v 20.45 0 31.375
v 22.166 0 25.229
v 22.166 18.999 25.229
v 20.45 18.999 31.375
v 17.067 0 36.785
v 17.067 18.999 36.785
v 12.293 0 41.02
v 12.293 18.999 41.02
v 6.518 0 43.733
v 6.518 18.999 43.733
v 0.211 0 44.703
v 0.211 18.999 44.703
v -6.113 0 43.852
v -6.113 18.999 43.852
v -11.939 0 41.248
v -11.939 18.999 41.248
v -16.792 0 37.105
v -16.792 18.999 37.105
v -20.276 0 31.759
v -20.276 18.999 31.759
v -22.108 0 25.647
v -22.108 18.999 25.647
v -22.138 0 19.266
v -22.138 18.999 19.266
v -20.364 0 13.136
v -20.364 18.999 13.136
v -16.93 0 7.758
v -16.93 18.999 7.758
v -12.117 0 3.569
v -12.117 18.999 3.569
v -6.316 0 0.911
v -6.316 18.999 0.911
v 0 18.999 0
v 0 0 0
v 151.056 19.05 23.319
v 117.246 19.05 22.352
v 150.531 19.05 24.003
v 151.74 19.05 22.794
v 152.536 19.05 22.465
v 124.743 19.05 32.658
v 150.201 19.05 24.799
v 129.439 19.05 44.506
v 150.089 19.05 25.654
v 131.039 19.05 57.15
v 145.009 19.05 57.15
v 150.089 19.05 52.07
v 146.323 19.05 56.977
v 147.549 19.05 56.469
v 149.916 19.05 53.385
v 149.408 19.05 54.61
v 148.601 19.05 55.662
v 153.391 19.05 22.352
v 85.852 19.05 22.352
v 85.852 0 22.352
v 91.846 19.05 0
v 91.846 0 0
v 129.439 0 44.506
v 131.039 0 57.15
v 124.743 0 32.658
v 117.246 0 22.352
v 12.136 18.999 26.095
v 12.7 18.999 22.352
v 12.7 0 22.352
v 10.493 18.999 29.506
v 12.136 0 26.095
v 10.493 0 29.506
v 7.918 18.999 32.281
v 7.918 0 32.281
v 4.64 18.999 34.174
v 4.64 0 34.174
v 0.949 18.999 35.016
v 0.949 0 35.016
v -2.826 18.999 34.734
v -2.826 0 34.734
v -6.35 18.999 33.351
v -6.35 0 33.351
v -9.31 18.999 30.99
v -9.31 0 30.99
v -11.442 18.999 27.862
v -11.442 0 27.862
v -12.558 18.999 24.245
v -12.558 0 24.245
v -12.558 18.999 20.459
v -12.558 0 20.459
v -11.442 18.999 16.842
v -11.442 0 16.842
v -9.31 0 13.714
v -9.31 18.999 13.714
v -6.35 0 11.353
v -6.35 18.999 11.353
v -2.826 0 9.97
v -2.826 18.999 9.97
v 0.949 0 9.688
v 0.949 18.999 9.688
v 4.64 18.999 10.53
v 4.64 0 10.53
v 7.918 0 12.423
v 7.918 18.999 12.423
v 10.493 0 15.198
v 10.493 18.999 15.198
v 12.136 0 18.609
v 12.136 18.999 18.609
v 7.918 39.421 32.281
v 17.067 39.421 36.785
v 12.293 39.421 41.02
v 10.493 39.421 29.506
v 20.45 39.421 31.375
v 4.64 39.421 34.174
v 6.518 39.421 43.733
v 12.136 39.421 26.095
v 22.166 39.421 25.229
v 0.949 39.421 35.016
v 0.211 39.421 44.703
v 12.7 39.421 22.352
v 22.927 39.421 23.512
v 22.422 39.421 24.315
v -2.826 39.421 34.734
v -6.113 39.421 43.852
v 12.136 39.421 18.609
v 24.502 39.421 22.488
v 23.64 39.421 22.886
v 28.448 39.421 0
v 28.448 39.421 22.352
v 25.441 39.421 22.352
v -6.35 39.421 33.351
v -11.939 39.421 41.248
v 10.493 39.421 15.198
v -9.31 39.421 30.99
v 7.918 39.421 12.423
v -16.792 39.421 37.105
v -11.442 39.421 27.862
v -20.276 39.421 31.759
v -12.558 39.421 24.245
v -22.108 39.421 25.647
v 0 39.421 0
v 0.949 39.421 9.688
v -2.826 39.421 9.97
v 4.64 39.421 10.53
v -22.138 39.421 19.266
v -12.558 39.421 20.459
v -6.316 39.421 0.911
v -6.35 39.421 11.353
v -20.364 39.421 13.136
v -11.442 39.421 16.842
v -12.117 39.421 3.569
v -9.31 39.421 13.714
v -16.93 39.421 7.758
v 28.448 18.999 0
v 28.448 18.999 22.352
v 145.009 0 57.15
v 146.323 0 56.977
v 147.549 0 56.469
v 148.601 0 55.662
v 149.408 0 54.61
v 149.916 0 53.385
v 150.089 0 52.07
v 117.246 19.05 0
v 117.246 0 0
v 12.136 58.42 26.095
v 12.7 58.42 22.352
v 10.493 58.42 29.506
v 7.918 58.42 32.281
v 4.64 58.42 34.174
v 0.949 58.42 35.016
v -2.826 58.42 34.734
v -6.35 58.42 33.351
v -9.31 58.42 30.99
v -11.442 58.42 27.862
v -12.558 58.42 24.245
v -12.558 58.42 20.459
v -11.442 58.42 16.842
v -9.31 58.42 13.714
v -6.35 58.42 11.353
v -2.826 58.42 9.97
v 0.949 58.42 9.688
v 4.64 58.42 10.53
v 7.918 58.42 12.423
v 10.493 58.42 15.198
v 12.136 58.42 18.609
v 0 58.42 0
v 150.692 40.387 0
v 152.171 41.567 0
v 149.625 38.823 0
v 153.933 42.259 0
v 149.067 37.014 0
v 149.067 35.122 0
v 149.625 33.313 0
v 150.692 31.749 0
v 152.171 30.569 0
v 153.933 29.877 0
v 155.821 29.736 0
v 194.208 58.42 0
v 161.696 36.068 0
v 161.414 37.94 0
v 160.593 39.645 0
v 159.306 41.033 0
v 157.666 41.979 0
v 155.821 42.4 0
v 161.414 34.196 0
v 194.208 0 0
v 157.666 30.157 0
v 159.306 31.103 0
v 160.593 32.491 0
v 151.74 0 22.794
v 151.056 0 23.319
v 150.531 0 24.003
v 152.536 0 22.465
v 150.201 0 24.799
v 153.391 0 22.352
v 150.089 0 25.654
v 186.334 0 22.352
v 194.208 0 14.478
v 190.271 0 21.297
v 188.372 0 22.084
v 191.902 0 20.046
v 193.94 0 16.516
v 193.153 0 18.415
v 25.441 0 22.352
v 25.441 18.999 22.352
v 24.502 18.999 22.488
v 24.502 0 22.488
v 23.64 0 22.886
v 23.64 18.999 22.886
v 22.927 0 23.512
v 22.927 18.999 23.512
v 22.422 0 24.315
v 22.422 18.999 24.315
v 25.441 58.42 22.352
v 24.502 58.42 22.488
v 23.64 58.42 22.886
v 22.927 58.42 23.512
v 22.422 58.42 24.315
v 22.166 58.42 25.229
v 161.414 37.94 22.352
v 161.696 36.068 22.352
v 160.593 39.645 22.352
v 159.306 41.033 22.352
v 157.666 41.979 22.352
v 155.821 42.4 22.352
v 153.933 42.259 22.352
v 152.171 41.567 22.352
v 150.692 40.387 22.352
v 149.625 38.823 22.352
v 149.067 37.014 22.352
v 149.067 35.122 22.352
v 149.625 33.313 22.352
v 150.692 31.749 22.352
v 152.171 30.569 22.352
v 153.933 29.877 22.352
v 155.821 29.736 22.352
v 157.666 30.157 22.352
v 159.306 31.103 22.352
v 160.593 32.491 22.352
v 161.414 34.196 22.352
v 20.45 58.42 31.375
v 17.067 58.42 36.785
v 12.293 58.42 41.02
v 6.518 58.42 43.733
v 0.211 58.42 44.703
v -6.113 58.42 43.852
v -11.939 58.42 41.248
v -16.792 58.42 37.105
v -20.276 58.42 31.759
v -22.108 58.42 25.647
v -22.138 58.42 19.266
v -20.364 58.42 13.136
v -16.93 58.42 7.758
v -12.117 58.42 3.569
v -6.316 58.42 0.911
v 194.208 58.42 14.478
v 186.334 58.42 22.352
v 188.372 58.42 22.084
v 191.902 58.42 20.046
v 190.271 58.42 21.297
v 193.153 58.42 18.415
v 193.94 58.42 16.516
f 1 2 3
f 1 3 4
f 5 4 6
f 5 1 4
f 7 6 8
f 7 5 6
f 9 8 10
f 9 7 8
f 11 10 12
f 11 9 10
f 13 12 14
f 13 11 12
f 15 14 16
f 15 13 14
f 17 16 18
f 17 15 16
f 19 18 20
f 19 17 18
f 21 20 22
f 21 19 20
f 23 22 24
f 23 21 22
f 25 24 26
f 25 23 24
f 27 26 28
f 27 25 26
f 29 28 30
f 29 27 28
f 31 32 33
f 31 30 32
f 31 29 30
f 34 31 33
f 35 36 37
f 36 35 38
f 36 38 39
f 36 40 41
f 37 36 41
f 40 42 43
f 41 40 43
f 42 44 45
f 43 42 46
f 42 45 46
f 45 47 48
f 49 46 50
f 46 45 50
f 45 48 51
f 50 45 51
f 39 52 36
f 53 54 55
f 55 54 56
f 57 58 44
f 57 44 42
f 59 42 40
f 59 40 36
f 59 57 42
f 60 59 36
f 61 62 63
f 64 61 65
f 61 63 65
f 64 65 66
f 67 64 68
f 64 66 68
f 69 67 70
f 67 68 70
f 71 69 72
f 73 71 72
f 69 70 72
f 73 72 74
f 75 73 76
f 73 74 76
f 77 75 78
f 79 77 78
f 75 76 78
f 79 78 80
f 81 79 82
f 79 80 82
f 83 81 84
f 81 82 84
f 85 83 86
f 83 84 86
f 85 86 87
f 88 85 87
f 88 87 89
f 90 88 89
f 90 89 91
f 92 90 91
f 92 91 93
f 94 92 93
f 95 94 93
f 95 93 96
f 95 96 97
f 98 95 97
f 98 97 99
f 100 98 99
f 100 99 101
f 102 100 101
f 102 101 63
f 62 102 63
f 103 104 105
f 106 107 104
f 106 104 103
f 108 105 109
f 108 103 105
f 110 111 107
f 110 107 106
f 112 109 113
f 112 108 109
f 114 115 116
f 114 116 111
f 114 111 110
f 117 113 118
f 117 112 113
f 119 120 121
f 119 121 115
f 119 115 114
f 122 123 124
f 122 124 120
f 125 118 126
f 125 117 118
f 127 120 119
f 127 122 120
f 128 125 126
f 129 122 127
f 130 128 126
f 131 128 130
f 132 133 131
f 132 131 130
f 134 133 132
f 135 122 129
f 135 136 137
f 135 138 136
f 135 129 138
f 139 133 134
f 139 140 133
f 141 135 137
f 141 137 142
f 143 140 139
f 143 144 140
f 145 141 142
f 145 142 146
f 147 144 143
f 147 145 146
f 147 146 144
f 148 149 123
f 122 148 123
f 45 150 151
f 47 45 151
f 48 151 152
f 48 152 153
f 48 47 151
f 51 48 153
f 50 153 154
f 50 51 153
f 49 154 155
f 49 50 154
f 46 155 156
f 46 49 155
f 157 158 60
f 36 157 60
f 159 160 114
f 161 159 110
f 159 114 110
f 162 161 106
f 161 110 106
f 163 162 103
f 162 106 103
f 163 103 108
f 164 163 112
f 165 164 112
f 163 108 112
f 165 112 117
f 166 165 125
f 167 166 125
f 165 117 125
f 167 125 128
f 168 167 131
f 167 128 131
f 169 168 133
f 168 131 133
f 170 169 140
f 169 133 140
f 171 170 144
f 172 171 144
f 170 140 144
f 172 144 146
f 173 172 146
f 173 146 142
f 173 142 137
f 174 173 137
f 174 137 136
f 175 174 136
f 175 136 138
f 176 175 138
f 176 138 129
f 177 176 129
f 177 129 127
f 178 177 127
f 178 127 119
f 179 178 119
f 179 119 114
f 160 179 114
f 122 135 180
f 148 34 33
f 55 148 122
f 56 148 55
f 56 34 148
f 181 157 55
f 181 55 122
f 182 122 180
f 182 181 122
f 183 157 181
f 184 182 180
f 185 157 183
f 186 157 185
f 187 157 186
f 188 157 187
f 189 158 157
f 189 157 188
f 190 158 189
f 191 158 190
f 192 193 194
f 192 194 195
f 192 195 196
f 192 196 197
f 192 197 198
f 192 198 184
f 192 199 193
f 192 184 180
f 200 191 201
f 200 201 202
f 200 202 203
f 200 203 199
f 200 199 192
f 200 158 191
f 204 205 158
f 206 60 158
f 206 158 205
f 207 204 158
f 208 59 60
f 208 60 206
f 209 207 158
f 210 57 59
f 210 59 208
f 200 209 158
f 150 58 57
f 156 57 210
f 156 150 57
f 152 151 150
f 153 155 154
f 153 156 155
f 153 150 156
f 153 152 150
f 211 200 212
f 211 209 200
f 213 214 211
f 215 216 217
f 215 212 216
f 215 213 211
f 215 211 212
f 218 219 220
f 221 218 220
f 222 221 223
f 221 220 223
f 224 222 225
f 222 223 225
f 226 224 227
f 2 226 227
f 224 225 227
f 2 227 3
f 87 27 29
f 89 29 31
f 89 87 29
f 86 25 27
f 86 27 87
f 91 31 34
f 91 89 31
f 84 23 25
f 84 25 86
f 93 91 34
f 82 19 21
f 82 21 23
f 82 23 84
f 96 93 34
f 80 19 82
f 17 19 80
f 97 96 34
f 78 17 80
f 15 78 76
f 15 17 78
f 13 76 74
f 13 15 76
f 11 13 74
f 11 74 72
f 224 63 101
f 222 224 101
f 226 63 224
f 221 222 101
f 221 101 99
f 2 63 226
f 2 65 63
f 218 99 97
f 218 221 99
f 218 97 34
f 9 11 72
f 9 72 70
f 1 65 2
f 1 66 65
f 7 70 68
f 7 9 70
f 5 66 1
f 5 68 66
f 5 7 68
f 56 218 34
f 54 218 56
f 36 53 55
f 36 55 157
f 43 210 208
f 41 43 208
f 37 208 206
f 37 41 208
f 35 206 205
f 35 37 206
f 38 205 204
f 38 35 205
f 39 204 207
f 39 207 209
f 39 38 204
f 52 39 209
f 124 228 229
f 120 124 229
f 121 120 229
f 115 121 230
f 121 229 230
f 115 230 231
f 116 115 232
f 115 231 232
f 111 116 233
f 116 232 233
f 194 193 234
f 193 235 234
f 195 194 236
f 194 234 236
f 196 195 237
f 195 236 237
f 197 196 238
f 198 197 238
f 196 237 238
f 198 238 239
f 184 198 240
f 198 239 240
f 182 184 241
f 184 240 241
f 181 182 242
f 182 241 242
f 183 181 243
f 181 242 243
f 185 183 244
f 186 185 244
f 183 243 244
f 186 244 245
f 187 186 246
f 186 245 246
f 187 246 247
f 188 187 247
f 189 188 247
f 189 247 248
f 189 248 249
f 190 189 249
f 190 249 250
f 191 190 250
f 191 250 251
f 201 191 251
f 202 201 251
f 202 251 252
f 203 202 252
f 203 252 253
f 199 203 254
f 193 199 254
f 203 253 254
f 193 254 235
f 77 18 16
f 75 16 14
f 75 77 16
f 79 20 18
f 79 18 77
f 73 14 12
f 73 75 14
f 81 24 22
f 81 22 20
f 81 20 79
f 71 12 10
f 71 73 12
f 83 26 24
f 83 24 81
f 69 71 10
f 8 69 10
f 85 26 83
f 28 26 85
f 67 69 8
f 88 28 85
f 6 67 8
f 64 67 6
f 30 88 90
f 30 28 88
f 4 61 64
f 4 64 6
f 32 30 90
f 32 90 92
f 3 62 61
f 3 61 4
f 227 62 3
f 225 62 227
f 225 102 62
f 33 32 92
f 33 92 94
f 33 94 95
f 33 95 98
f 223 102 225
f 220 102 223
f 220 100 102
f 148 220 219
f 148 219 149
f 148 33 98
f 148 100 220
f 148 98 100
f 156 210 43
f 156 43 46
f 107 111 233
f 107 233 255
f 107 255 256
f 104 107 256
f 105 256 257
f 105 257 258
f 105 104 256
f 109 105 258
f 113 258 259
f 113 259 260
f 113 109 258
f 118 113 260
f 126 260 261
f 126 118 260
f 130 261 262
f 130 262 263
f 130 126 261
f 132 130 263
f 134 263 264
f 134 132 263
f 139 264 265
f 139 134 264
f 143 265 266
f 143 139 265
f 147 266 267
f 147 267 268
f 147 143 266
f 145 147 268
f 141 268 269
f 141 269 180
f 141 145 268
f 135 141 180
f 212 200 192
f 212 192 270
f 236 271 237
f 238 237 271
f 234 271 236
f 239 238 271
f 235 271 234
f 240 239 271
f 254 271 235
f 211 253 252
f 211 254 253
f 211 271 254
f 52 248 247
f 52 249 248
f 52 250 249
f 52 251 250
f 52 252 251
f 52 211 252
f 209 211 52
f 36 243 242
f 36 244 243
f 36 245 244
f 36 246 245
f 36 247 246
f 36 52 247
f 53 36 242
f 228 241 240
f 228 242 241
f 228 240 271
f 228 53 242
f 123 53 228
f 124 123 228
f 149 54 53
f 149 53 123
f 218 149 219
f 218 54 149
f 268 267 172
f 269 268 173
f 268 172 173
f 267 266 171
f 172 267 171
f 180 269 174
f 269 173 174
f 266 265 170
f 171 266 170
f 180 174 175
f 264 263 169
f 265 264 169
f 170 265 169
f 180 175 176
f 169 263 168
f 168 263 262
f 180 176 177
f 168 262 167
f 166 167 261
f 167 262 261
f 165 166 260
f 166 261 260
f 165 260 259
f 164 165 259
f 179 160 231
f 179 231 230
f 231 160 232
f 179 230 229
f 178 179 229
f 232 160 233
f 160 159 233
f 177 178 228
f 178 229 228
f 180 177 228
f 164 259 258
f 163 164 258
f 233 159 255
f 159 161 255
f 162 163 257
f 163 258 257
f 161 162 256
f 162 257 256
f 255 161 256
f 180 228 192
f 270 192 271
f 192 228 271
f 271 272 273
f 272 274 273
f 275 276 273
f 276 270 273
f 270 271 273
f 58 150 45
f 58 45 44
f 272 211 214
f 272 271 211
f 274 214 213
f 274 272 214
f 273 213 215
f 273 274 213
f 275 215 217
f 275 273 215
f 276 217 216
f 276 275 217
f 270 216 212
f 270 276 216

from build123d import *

# Parameters (mm, degrees)
F0_R     = 12.7
F1_DEPTH = 58.42
F2_DEPTH = 19.05
F3_DEPTH = 19.05
F4_R     = 6.35
F5_DEPTH = 38.1
F6_R     = 3.302
F7_R     = 5.08
F8_R     = 7.874
F4_W     = 44.704
F4_H     = 20.4216
F4_W_2   = 6.096
F9_DEPTH = 38.1


# Not quite as in the source:
# - a feature names something its author has since deleted; it is built from what else it names


with BuildPart() as f1:
    # F0 (on Front) → F1 (new body)
    with BuildSketch(Plane.XZ):
        Polygon((85.852, 22.352), (91.8464, 0), (117.2464, 0), (117.2464, 22.352), align=None)
        with BuildLine():
            ThreePointArc((22.352, 22.352), (15.8052507731, 6.5467492269), (0, 0))
            Line((0, 0), (91.8464, 0))
            Line((91.8464, 0), (85.852, 22.352))
            Line((85.852, 22.352), (22.352, 22.352))
        make_face()
        Polygon((117.2464, 22.352), (117.2464, 0), (194.2084, 0), (194.2084, 22.352), (150.0886, 22.352), align=None)
        with BuildLine():
            ThreePointArc((22.352, 22.352), (-15.8052507731, 38.1572507731), (0, 0))
            ThreePointArc((0, 0), (15.8052507731, 6.5467492269), (22.352, 22.352))
        make_face()
        with Locations((0, 22.352)):
            Circle(F0_R, mode=Mode.SUBTRACT)
    extrude(amount=-F1_DEPTH)

    # F0 (on Front) → F2 (cut)
    with BuildSketch(Plane.XZ):
        Polygon((85.852, 22.352), (91.8464, 0), (117.2464, 0), (117.2464, 22.352), align=None)
    extrude(amount=-F2_DEPTH, mode=Mode.SUBTRACT)

    # F0 (on Front) → F3 (join)
    with BuildSketch(Plane.XZ):
        with BuildLine():
            ThreePointArc((131.0386, 57.15), (127.4644153616, 38.4343576341), (117.2464, 22.352))
            Line((117.2464, 22.352), (150.0886, 22.352))
            Line((150.0886, 22.352), (150.0886, 57.15))
            Line((150.0886, 57.15), (131.0386, 57.15))
        make_face()
    extrude(amount=-F3_DEPTH)

    # F4 (on face) → F5 (cut, symmetric)
    with BuildSketch(Plane.XY.offset(22.352)):
        with Locations((155.3464, 36.068)):
            Circle(F4_R)
    extrude(amount=F5_DEPTH, both=True, mode=Mode.SUBTRACT)

    # F6
    f6_edges = [f1.edges().sort_by_distance(p)[0] for p in [
        (22.352, 29.21, 22.352),
        (150.0886, 9.525, 22.352),
    ]]
    fillet(f6_edges, radius=F6_R)

    # F7
    f7_edges = [f1.edges().sort_by_distance(p)[0] for p in [
        (150.0886, 9.525, 57.15),
    ]]
    fillet(f7_edges, radius=F7_R)

    # F8
    f8_edges = [f1.edges().sort_by_distance(p)[0] for p in [
        (194.2084, 29.21, 22.352),
    ]]
    fillet(f8_edges, radius=F8_R)

    # F4 (on face) → F9 (cut, symmetric)
    with BuildSketch(Plane.XY.offset(22.352)):
        with Locations((0, 29.21)):
            Rectangle(F4_W, F4_H)
        with Locations((25.4, 29.21)):
            Rectangle(F4_W_2, F4_H)
        with Locations((155.3464, 36.068)):
            Circle(F4_R)
    extrude(amount=F9_DEPTH, both=True, mode=Mode.SUBTRACT)


solid = f1.part
